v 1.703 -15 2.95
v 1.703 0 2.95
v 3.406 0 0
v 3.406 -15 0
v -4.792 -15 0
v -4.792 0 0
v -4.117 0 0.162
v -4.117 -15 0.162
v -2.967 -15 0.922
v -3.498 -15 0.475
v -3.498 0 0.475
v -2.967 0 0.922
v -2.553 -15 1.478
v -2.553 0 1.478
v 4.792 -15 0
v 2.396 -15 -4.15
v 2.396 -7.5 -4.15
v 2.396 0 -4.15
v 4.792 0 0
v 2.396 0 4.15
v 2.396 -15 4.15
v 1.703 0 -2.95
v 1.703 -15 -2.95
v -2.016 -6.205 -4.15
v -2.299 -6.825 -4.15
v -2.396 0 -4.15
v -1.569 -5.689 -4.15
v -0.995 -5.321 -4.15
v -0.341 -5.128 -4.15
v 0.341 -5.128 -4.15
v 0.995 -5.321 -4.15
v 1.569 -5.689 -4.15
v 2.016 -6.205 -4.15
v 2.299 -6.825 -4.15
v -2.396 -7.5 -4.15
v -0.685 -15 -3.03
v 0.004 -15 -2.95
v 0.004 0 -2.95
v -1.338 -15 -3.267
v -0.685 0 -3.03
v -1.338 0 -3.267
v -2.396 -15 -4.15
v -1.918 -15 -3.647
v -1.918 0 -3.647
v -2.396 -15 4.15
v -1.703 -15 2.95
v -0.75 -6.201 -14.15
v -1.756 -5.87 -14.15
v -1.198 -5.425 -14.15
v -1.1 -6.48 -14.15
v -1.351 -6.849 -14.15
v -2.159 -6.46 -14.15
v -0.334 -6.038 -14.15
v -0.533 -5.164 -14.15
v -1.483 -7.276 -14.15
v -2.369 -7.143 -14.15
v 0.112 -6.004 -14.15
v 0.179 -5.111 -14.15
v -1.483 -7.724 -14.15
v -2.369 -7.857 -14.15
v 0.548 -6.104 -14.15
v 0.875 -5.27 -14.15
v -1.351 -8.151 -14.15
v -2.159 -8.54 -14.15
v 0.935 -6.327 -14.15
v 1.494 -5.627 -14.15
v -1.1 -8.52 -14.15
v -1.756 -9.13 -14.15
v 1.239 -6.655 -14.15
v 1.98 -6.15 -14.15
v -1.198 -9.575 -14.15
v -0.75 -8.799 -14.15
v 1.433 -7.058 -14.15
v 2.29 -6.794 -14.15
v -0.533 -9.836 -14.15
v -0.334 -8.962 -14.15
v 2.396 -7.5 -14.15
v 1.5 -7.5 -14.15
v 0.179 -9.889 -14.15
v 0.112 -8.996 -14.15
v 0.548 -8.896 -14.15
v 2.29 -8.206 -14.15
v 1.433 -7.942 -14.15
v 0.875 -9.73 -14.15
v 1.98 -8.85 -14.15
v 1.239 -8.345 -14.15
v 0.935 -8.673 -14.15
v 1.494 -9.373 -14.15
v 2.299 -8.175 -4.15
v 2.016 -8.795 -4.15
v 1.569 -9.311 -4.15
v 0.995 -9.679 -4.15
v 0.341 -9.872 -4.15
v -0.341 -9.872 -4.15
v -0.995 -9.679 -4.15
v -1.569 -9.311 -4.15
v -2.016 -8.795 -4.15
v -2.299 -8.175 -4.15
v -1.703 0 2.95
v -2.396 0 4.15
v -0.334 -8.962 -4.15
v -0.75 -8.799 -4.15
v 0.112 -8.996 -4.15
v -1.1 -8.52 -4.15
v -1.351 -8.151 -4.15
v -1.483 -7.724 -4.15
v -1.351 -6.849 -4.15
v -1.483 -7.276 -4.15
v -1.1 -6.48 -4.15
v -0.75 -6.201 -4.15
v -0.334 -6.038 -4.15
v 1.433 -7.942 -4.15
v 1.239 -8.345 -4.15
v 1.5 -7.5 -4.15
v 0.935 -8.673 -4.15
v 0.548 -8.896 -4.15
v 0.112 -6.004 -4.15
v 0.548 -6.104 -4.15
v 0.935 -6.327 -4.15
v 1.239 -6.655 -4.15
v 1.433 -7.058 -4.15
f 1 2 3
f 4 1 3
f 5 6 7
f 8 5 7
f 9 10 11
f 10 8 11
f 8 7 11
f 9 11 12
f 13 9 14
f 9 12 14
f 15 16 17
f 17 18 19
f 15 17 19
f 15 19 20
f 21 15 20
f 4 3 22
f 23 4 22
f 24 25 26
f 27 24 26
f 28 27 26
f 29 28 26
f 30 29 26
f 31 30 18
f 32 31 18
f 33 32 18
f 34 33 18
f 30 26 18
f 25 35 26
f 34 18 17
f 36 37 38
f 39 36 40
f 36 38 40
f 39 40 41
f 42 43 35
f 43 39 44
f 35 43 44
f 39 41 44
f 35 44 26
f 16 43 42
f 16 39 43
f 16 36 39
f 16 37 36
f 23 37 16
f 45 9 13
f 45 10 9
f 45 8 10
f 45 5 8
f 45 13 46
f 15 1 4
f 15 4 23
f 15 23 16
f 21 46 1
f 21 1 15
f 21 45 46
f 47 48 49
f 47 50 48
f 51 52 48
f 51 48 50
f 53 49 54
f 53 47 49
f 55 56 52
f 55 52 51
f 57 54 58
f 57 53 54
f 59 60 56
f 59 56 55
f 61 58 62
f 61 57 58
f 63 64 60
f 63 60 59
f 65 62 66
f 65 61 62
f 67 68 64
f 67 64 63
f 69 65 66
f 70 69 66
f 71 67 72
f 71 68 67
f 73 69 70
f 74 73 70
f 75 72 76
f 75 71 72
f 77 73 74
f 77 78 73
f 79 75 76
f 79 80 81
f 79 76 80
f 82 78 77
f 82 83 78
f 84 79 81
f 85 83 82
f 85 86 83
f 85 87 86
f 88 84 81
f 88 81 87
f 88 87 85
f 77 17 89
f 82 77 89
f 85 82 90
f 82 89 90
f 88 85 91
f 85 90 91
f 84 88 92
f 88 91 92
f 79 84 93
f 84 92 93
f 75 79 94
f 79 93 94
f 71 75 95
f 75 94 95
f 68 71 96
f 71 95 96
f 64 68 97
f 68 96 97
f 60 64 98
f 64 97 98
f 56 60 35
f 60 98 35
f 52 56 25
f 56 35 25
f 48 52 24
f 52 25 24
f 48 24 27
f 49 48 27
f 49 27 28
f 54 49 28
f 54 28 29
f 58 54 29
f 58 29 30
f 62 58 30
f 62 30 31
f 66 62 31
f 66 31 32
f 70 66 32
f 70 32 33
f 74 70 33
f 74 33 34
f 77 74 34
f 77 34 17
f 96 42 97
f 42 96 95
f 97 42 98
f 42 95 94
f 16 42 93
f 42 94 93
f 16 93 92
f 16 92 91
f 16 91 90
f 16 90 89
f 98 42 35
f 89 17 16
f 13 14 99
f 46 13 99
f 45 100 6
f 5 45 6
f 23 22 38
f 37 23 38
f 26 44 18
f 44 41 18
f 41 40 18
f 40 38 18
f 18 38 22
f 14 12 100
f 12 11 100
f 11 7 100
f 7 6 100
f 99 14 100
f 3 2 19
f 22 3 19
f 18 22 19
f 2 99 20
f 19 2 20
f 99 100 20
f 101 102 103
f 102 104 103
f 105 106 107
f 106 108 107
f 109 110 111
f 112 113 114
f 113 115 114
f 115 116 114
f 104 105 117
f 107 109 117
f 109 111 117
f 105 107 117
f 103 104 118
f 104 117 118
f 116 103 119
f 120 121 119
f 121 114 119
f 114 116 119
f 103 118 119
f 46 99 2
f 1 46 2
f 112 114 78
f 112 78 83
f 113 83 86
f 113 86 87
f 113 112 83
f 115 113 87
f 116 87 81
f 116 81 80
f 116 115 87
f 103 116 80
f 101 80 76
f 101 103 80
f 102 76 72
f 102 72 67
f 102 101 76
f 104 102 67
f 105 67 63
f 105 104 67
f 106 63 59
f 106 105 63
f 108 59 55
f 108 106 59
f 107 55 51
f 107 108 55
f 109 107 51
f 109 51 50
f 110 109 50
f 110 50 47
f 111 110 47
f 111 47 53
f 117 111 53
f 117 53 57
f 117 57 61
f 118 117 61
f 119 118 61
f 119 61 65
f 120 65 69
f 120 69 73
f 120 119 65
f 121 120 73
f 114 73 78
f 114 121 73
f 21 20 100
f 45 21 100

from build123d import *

# Parameters (mm, degrees)
F1_DEPTH    = 15
F2_T1_DEPTH = 23.5358983849
F3_R        = 1.5
F4_DEPTH    = 10


# Not quite as in the source:
# - a fillet or chamfer that OpenCascade refuses, or shapes differently, is made with other operations: its cross-section is extruded or revolved along the edge and cut away or added


with BuildPart() as f1:
    # F0 (on Front) → F1 (new body)
    with BuildSketch(Plane.XZ):
        Polygon((-3.4063665882, 0), (-1.7031832941, 2.95), (1.7031832941, 2.95), (3.4063665882, 0), (1.7031832941, -2.95), (-1.7031832941, -2.95), (-2.3960036171, -4.15), (2.3960036171, -4.15), (4.7920072343, 0), (2.3960036171, 4.15), (-2.3960036171, 4.15), (-4.7920072343, 0), align=None)
    extrude(amount=F1_DEPTH)

    # F2: fillet of radius 3 on 2 edges, made by hand

    # F2_s2 → F2_t1 (cut)
    with BuildSketch(Plane.XZ.offset(-4.2679491924)):
        with BuildLine():
            ThreePointArc((-4.7920072343, 0), (-3.4978833466, 0.4749251787), (-2.5527767497, 1.4784609691))
            Line((-2.5527767497, 1.4784609691), (-3.4063665882, 0))
            Line((-3.4063665882, 0), (-4.7920072343, 0))
        make_face()
        with BuildLine():
            ThreePointArc((0.0039963829, -2.95), (-1.3376444036, -3.266718427), (-2.3960036171, -4.15))
            Line((-2.3960036171, -4.15), (-1.7031832941, -2.95))
            Line((-1.7031832941, -2.95), (0.0039963829, -2.95))
        make_face()
    extrude(amount=F2_T1_DEPTH, mode=Mode.SUBTRACT)

    # F3 (on face) → F4 (join)
    with BuildSketch(Plane(origin=(0, 0, -4.15), x_dir=(1, 0, 0), z_dir=(0, 0, -1))):
        with BuildLine():
            ThreePointArc((-2.3960036171, 7.5), (0, 5.1039963829), (2.3960036171, 7.5))
            ThreePointArc((2.3960036171, 7.5), (0, 9.8960036171), (-2.3960036171, 7.5))
        make_face()
        with Locations((0, 7.5)):
            Circle(F3_R, mode=Mode.SUBTRACT)
    extrude(amount=F4_DEPTH)


solid = f1.part
